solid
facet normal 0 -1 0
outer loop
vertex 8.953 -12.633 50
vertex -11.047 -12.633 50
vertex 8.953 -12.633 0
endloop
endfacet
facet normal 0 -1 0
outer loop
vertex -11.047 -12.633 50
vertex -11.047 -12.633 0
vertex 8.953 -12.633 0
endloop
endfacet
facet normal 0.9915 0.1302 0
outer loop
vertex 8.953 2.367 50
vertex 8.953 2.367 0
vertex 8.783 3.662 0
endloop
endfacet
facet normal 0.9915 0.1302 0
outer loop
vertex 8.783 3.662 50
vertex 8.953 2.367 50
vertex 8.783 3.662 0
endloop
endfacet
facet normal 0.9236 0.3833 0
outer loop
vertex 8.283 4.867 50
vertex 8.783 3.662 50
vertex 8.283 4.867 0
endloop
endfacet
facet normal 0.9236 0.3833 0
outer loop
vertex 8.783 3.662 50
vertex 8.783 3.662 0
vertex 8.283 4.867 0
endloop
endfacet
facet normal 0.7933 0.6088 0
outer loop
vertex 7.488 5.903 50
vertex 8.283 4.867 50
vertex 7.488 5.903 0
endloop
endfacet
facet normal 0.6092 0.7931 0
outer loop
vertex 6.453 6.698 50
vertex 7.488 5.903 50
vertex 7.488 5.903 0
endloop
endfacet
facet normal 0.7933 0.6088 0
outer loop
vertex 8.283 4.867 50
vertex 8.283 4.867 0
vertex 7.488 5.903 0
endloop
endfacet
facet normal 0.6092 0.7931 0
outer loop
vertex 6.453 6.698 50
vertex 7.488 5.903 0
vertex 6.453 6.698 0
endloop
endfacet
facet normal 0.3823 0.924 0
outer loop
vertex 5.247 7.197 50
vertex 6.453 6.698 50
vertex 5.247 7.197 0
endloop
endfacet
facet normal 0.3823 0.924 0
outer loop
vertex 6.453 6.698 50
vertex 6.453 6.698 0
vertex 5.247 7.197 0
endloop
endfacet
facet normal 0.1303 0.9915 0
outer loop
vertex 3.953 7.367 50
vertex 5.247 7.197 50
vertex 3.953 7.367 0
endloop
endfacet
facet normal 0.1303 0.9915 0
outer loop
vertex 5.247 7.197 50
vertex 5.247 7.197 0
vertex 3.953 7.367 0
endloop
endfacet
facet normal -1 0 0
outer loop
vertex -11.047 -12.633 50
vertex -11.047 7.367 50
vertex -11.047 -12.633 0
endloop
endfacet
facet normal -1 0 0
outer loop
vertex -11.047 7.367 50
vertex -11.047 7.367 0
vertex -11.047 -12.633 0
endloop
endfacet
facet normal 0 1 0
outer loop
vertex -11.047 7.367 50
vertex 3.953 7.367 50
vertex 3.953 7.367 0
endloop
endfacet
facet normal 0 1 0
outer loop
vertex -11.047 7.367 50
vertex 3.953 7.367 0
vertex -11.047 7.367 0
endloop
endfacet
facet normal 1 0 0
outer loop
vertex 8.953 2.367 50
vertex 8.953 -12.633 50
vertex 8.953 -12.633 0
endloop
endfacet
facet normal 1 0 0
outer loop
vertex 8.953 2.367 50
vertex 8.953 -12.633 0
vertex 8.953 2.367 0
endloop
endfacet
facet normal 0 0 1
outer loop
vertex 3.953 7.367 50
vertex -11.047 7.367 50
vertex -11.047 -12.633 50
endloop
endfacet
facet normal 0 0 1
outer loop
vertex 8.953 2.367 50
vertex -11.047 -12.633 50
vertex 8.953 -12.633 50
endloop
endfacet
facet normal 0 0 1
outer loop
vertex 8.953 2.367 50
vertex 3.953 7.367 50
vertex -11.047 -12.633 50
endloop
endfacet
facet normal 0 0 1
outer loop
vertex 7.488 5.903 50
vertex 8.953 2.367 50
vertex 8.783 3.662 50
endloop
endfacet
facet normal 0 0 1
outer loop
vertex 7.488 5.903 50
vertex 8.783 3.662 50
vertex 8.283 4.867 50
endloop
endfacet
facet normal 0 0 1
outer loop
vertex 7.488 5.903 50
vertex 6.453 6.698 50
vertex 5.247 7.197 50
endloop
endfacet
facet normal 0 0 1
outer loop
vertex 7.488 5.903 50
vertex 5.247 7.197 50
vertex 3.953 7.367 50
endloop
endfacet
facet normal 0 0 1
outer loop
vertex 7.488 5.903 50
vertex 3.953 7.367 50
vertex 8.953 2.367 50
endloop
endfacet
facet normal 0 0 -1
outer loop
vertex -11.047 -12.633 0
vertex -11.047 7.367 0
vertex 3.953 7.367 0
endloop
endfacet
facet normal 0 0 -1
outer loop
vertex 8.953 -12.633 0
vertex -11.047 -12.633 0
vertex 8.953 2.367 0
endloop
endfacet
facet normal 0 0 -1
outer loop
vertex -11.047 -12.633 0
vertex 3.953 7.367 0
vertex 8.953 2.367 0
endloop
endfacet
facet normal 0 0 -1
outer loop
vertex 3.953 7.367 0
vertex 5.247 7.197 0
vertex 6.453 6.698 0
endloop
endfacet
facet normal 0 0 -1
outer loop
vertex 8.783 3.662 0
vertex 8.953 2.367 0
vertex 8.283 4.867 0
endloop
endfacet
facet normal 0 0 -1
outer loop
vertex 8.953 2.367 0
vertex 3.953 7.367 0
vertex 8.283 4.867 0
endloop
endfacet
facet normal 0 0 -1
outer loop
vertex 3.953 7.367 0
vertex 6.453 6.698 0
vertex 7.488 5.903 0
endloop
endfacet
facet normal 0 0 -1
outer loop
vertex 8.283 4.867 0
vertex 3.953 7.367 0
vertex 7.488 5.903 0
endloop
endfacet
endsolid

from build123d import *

# Parameters (mm, degrees)
F1_DEPTH = 25
F2_DEPTH = 25


with BuildPart() as f1:
    # F0 (on Top) → F1 (new body)
    with BuildSketch(Plane.XY):
        with BuildLine():
            Line((3.952905, 7.36742), (-11.047095, 7.36742))
            Line((-11.047095, 7.36742), (-11.047095, -12.63258))
            Line((-11.047095, -12.63258), (8.952905, -12.63258))
            Line((8.952905, -12.63258), (8.952905, 2.36742))
            ThreePointArc((8.952905, 2.36742), (7.488439, 5.902954), (3.952905, 7.36742))
        make_face()
    extrude(amount=F1_DEPTH)

    # F1_face (on face) → F2 (join)
    with BuildSketch(Plane(origin=(-1.167861, -2.753346, 25), x_dir=(1, 0, 0), z_dir=(0, 0, 1))):
        with BuildLine():
            Line((5.120766, 10.120766), (-9.879234, 10.120766))
            Line((-9.879234, 10.120766), (-9.879234, -9.879234))
            Line((-9.879234, -9.879234), (10.120766, -9.879234))
            Line((10.120766, -9.879234), (10.120766, 5.120766))
            ThreePointArc((10.120766, 5.120766), (8.6563, 8.6563), (5.120766, 10.120766))
        make_face()
    extrude(amount=F2_DEPTH)


solid = f1.part
